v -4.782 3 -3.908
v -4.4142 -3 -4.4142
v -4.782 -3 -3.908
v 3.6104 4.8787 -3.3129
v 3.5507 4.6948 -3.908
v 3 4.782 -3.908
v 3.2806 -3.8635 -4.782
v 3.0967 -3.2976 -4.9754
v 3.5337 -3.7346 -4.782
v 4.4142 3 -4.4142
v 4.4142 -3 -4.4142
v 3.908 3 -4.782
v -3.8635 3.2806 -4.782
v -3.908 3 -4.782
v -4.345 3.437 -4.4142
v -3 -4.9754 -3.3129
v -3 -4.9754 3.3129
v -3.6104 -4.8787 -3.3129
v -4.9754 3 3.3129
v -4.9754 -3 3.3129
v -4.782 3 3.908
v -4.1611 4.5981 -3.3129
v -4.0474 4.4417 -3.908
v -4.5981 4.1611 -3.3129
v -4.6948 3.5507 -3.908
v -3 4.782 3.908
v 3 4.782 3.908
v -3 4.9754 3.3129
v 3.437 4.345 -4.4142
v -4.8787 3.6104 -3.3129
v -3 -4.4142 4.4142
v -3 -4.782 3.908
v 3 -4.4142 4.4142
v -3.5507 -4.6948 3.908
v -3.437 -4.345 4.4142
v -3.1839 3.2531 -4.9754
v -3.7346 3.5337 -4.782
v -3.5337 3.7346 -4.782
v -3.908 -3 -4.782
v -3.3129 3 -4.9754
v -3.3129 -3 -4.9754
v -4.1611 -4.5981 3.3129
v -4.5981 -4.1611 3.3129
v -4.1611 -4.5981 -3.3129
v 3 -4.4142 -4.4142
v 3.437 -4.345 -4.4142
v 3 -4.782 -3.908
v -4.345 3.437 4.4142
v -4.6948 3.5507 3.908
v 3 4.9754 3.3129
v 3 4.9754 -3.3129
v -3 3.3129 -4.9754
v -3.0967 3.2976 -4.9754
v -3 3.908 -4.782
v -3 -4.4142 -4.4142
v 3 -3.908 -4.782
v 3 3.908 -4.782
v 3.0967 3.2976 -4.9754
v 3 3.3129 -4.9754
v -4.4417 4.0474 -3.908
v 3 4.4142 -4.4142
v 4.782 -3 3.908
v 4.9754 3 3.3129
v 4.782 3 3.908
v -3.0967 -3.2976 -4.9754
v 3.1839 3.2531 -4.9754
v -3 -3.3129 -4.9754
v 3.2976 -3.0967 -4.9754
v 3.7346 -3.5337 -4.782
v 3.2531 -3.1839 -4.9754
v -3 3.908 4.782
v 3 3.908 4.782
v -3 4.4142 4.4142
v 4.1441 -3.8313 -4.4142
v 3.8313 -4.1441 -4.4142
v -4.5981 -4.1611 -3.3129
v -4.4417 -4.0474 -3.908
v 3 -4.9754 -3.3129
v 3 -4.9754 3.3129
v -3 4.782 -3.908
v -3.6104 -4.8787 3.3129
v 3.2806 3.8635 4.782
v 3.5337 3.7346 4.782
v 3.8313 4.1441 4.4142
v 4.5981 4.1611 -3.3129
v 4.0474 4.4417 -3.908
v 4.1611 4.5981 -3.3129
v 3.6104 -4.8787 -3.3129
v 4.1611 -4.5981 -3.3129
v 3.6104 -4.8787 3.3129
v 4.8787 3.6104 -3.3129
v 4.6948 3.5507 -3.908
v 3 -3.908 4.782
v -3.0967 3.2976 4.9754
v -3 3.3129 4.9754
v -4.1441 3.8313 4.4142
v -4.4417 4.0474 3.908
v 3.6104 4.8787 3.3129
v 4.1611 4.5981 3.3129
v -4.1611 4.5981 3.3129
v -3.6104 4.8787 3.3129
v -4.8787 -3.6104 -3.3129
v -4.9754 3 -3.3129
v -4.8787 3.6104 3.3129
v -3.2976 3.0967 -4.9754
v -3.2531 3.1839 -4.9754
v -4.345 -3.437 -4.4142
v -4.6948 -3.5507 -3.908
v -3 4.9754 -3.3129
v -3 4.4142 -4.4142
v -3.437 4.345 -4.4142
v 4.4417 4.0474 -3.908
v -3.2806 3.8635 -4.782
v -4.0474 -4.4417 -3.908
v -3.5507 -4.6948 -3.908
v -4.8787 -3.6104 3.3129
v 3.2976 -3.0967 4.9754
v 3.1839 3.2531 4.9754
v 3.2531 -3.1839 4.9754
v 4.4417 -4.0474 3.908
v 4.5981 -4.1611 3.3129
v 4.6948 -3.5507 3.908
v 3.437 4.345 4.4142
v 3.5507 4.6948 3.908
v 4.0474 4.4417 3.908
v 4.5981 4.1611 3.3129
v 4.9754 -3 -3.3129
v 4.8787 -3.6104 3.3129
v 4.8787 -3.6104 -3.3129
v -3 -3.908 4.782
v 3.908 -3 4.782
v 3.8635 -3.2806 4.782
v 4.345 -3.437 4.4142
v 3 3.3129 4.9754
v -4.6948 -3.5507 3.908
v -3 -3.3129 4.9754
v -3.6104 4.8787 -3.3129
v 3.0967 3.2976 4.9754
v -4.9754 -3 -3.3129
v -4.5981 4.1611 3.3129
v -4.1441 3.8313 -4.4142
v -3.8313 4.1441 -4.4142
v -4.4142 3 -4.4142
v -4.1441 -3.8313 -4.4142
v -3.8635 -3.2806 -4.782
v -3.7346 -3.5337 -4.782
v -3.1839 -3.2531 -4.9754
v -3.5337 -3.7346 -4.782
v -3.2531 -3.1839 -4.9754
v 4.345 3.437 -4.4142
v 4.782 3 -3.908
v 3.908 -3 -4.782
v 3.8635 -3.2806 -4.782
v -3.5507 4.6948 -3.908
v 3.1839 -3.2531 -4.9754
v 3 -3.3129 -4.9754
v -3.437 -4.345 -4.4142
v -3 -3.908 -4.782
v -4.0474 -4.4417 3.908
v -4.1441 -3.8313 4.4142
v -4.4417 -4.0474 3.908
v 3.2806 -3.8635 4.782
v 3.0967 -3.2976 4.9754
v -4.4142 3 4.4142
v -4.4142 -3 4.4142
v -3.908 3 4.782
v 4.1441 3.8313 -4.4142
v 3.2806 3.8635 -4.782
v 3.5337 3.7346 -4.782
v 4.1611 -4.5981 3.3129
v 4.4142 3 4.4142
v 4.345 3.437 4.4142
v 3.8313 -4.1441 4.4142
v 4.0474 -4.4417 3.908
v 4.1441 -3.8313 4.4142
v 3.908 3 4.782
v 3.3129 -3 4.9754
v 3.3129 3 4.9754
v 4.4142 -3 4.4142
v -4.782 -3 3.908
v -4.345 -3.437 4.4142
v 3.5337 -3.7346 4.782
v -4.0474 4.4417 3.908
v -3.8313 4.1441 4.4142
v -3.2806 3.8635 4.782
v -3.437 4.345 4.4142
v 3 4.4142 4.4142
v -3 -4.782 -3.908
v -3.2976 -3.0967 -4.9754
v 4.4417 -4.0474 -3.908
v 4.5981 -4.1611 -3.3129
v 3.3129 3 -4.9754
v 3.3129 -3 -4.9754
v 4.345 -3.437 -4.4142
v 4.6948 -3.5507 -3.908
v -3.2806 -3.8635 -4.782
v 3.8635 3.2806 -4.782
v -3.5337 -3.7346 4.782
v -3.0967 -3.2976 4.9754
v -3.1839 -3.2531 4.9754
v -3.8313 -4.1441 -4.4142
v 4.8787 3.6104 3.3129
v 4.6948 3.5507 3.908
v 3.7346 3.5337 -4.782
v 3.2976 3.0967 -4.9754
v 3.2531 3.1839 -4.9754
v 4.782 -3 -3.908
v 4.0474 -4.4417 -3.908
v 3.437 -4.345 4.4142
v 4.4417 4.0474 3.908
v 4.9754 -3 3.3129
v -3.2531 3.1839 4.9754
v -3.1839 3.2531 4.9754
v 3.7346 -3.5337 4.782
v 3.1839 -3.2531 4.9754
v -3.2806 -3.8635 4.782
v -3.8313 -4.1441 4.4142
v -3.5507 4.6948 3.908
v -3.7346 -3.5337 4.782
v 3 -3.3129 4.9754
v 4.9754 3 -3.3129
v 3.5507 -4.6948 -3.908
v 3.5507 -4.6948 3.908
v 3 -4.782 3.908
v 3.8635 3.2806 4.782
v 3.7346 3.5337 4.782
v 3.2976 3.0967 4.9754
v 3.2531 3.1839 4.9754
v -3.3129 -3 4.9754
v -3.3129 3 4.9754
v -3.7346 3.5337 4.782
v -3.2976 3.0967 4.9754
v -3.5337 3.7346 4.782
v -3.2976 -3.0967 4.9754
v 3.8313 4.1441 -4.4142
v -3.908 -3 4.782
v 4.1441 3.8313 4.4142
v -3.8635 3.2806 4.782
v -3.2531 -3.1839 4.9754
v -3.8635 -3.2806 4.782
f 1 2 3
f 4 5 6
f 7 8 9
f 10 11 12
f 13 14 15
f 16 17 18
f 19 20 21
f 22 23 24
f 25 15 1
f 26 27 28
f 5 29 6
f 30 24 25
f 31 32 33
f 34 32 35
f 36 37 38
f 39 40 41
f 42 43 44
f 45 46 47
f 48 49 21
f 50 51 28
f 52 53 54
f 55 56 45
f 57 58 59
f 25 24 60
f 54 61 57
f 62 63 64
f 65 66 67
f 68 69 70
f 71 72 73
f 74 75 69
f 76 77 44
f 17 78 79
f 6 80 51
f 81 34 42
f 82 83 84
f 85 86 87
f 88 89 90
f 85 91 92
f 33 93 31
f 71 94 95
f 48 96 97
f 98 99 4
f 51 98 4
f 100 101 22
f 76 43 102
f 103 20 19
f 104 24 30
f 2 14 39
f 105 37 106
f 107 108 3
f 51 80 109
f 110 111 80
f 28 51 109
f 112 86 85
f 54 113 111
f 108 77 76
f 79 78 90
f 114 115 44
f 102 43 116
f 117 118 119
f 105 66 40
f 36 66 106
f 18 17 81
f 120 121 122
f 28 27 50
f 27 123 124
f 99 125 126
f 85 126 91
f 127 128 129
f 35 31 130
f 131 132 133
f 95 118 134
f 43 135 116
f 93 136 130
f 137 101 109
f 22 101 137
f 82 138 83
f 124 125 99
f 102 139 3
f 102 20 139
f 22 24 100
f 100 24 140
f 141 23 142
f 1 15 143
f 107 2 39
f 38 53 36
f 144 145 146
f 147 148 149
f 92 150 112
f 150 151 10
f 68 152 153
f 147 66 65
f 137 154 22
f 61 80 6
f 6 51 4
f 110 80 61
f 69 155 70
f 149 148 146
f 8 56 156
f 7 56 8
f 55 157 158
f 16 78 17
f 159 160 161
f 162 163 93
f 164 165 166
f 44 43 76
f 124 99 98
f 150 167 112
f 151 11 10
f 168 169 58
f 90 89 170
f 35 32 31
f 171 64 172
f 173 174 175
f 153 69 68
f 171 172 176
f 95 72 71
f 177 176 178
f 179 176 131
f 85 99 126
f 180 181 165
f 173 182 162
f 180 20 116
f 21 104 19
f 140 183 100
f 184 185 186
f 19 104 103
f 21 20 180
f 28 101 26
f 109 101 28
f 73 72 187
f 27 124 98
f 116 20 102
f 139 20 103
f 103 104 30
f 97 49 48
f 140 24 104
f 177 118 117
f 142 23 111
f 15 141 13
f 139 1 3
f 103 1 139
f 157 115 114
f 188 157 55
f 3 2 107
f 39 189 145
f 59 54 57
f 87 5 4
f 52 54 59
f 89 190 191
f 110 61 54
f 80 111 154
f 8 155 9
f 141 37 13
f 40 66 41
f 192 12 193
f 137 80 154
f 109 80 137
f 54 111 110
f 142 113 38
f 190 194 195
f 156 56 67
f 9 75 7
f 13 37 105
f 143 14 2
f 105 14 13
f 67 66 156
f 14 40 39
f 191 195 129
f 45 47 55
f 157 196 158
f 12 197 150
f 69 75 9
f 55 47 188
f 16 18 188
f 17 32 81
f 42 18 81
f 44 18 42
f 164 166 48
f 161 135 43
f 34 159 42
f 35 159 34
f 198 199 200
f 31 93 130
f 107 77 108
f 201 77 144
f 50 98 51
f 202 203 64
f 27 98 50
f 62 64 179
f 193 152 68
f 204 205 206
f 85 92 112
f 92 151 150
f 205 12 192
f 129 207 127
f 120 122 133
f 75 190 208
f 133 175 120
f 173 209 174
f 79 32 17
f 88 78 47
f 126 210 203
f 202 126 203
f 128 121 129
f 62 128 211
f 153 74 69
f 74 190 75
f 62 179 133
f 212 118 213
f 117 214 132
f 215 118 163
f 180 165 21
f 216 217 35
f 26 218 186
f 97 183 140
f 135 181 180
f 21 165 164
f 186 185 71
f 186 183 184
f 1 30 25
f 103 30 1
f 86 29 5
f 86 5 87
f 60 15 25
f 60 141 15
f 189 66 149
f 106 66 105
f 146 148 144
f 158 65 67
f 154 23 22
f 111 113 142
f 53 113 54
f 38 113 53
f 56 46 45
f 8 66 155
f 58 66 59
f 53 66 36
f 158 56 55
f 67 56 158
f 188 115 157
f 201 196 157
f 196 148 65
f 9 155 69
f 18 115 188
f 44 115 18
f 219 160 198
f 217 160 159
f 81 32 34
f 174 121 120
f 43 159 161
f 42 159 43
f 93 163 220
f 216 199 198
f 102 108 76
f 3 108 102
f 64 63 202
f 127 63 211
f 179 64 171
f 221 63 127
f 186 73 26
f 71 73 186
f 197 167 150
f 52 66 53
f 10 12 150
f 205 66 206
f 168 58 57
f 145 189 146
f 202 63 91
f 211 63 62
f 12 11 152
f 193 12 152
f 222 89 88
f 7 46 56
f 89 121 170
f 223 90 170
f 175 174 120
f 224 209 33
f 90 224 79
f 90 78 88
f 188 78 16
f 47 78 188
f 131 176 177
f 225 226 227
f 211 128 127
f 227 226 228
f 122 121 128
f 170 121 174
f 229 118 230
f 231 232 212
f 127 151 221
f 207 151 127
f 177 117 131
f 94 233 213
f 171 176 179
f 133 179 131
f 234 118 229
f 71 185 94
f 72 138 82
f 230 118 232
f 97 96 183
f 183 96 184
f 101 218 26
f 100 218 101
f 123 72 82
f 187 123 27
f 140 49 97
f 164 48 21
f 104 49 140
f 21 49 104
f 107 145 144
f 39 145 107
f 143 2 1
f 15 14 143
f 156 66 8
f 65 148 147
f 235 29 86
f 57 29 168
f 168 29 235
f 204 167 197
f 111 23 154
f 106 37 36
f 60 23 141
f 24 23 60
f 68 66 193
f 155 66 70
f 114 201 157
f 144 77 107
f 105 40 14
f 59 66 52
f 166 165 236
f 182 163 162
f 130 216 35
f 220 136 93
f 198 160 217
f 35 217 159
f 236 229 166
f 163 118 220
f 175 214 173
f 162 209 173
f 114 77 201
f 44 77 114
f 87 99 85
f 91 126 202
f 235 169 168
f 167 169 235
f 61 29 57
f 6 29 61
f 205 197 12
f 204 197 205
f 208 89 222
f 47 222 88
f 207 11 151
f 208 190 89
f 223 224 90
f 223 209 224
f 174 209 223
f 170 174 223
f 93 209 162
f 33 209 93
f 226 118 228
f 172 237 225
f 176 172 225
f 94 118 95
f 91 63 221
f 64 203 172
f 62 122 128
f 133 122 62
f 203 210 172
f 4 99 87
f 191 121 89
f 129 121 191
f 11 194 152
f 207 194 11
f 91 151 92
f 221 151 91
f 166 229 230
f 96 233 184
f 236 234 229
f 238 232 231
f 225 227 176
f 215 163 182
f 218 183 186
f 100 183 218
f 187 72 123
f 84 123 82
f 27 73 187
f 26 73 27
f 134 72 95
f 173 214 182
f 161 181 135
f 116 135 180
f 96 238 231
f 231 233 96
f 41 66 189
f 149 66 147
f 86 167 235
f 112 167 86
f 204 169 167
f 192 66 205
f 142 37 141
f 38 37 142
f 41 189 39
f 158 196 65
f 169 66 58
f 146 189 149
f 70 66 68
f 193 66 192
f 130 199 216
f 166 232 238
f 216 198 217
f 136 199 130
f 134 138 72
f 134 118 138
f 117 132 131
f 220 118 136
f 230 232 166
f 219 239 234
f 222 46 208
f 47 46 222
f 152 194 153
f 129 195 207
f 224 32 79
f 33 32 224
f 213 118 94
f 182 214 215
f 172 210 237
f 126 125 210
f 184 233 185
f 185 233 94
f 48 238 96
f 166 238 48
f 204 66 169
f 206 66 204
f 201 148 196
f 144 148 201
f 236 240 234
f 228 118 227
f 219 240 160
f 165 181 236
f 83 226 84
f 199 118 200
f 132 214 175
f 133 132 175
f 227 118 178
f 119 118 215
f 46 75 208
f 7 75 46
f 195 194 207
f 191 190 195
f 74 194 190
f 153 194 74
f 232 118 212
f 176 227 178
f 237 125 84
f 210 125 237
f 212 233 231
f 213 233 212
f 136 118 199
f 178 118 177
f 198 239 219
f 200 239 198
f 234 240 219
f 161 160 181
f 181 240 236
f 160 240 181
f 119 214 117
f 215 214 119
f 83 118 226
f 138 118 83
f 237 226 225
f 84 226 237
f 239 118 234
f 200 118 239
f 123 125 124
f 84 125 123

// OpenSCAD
$fn = 20;

module draft() {
    translate([100, 0, 0])
    for(i = [0:5:360]) {
        rotate([0, 0, i])
        translate([30, 0, 0])
            sphere(r = 10);

    }

    for(i = [0,5,10,15,20]) {
        rotate([0, 0, i])
            translate([30, 0, 0])
                sphere(r = 10);
    }
}

module rounded_cube(l=10, r=2) {
    hull () {
        for (ix=[-1, 1]) {
            for (iy=[-1, 1]) {
                for (iz=[-1, 1]) {
                    translate([ix * (l/2 - r), iy * (l/2 - r), iz * (l/2 - r)])
                        sphere(r=2);

                }
            }
        }
    }
}

//translate([100, 0, 0])
//    draft();

rounded_cube();
